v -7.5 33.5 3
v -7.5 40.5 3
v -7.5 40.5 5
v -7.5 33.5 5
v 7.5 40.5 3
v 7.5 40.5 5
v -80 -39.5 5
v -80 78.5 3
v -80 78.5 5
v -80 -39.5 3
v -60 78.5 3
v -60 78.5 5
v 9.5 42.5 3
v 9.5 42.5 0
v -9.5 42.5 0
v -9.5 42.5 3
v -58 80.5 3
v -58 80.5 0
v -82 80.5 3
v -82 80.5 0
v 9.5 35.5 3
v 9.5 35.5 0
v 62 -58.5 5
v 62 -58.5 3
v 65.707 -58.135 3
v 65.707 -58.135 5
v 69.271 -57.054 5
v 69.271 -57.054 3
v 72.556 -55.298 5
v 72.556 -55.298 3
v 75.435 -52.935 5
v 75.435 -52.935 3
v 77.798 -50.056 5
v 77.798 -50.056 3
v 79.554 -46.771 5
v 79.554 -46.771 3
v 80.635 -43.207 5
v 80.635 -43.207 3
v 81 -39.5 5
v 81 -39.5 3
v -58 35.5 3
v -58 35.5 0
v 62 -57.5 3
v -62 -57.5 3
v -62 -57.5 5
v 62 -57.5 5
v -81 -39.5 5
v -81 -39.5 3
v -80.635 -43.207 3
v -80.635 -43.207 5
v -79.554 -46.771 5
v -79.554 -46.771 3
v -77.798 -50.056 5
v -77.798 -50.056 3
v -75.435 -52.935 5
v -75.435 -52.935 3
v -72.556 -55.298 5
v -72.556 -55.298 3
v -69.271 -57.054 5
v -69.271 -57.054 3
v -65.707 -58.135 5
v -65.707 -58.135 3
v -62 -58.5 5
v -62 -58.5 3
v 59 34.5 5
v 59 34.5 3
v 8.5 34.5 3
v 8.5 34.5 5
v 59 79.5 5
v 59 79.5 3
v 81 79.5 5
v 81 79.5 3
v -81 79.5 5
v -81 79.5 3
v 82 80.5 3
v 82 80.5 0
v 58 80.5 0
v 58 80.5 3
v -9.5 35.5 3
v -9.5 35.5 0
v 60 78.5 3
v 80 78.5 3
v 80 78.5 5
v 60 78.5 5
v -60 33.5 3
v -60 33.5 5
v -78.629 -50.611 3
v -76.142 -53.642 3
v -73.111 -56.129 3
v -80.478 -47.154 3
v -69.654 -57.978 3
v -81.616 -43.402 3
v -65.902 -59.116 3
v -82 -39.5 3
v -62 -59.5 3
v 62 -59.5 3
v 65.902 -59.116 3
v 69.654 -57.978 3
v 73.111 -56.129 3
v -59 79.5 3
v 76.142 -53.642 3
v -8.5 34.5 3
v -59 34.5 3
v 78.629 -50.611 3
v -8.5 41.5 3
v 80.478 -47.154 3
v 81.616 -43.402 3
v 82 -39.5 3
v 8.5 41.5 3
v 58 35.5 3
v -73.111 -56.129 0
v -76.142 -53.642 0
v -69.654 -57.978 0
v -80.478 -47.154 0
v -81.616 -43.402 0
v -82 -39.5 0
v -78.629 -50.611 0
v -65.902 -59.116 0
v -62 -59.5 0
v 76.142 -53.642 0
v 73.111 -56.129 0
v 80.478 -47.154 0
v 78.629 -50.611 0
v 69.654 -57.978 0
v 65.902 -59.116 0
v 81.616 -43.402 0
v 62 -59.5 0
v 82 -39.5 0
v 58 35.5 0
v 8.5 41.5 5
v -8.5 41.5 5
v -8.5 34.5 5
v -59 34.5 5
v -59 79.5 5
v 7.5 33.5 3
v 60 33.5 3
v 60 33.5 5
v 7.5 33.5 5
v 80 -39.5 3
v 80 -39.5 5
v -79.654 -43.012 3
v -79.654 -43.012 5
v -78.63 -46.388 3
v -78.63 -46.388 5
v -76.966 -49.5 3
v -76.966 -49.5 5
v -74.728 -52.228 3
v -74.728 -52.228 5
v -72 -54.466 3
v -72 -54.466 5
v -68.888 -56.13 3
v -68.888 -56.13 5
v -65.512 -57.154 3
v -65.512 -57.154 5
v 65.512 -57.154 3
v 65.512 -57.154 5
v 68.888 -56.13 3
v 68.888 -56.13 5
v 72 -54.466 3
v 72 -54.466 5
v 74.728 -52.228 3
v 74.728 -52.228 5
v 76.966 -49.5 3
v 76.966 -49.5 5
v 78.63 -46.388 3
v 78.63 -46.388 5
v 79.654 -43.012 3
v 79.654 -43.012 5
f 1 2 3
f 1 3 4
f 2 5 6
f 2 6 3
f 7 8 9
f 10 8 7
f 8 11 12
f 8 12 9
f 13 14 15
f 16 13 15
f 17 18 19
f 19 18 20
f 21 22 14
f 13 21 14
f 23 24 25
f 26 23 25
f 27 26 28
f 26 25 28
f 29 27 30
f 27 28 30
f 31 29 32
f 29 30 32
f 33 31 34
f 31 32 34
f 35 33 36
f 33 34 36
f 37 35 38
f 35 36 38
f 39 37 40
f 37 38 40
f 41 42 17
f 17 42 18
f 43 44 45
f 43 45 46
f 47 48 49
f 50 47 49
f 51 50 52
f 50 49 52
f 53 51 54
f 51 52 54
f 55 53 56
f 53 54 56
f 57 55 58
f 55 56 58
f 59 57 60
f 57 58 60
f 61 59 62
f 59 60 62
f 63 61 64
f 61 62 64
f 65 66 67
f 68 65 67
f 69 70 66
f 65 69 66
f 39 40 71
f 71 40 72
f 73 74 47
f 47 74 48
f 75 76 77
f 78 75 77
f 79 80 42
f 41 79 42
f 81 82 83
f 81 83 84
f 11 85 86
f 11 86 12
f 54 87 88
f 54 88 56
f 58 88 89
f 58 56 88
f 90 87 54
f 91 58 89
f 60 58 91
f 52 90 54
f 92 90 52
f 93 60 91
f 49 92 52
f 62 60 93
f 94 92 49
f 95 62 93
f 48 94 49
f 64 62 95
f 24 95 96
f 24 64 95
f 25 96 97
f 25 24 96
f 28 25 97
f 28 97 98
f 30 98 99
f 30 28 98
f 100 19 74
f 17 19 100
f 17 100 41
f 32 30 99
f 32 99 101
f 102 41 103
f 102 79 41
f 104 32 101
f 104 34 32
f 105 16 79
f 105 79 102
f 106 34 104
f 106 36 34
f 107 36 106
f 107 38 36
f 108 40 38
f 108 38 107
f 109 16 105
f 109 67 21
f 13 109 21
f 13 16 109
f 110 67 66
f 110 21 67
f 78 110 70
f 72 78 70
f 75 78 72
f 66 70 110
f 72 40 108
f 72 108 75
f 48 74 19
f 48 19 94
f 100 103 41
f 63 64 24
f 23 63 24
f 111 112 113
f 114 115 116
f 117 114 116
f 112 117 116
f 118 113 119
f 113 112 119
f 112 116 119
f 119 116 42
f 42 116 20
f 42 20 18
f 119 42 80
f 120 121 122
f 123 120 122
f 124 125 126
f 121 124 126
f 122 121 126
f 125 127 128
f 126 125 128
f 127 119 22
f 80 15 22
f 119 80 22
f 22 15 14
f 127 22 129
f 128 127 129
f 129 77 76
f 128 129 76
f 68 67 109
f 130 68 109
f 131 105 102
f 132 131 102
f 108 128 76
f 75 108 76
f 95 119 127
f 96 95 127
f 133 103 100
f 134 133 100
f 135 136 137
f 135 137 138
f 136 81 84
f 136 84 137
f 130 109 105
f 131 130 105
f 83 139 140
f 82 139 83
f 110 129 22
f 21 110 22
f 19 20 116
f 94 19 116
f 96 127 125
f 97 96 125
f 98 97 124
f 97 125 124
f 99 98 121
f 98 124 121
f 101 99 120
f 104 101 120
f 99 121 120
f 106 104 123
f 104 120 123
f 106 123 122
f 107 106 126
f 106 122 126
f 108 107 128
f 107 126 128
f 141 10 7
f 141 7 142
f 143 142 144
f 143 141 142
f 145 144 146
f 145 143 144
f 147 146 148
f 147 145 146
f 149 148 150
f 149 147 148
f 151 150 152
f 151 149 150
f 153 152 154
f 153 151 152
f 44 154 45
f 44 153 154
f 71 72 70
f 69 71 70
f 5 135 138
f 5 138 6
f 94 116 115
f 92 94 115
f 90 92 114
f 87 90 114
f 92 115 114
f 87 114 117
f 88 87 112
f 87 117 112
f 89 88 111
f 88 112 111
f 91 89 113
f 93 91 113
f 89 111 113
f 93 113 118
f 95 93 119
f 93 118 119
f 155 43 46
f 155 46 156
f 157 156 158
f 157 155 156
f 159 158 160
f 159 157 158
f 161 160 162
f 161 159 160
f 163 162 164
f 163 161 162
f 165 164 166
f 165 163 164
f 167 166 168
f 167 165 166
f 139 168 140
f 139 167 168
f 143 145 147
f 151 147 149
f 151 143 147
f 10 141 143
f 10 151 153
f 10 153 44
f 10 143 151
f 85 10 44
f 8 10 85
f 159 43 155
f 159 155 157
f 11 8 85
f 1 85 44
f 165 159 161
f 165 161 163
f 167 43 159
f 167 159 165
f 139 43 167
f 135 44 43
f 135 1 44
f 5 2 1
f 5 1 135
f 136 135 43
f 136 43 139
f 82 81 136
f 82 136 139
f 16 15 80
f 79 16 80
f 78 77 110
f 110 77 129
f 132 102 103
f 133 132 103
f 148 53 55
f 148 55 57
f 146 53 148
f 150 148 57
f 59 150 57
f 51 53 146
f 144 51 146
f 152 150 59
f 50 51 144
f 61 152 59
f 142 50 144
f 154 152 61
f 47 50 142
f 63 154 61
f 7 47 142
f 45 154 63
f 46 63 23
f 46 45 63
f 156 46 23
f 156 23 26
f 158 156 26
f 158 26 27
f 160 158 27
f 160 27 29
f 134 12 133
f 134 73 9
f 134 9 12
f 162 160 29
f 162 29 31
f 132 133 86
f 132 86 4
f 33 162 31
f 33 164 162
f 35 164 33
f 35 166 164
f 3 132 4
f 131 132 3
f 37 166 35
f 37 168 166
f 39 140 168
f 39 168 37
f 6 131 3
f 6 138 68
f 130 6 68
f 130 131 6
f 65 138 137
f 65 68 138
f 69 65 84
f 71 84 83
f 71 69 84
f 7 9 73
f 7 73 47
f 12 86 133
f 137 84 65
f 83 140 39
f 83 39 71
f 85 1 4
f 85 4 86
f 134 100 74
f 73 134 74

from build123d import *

# Parameters (mm, degrees)
RESSALTO_EXTRUS_O1_DEPTH = 3
RESSALTO_EXTRUS_O2_DEPTH = 2


with BuildPart() as part:
    # Esboço1 → Ressalto-extrusão1 (new body)
    with BuildSketch(Plane.XY):
        with BuildLine():
            Line((-58, 35.5), (-58, 80.5))
            Line((-58, 80.5), (-82, 80.5))
            Line((-82, 80.5), (-82, -39.5))
            ThreePointArc((-82, -39.5), (-76.142135624, -53.642135624), (-62, -59.5))
            Line((-62, -59.5), (62, -59.5))
            ThreePointArc((62, -59.5), (76.142135624, -53.642135624), (82, -39.5))
            Line((82, -39.5), (82, 80.5))
            Line((82, 80.5), (58, 80.5))
            Line((58, 80.5), (58, 35.5))
            Line((58, 35.5), (9.5, 35.5))
            Line((9.5, 35.5), (9.5, 42.5))
            Line((9.5, 42.5), (-9.5, 42.5))
            Line((-9.5, 42.5), (-9.5, 35.5))
            Line((-9.5, 35.5), (-58, 35.5))
        make_face()
    extrude(amount=RESSALTO_EXTRUS_O1_DEPTH)

    # Esboço2 → Ressalto-extrusão2 (add)
    with BuildSketch(Plane.XY.offset(3)):
        with BuildLine():
            Line((-8.5, 34.5), (-59, 34.5))
            Line((-59, 34.5), (-59, 79.5))
            Line((-59, 79.5), (-81, 79.5))
            Line((-81, 79.5), (-81, -39.5))
            ThreePointArc((-81, -39.5), (-75.435028843, -52.935028843), (-62, -58.5))
            Line((-62, -58.5), (62, -58.5))
            ThreePointArc((62, -58.5), (75.435028843, -52.935028843), (81, -39.5))
            Line((81, -39.5), (81, 79.5))
            Line((81, 79.5), (59, 79.5))
            Line((59, 79.5), (59, 34.5))
            Line((59, 34.5), (8.5, 34.5))
            Line((8.5, 34.5), (8.5, 41.5))
            Line((8.5, 41.5), (-8.5, 41.5))
            Line((-8.5, 41.5), (-8.5, 34.5))
        make_face()
        with BuildLine():
            Line((-80, 78.5), (-80, -39.5))
            ThreePointArc((-80, -39.5), (-74.727922061, -52.227922061), (-62, -57.5))
            Line((-62, -57.5), (62, -57.5))
            ThreePointArc((62, -57.5), (74.727922061, -52.227922061), (80, -39.5))
            Line((80, -39.5), (80, 78.5))
            Line((80, 78.5), (60, 78.5))
            Line((60, 78.5), (60, 33.5))
            Line((60, 33.5), (7.5, 33.5))
            Line((7.5, 33.5), (7.5, 40.5))
            Line((7.5, 40.5), (-7.5, 40.5))
            Line((-7.5, 40.5), (-7.5, 33.5))
            Line((-7.5, 33.5), (-60, 33.5))
            Line((-60, 33.5), (-60, 78.5))
            Line((-60, 78.5), (-80, 78.5))
        make_face(mode=Mode.SUBTRACT)
    extrude(amount=RESSALTO_EXTRUS_O2_DEPTH)


solid = part.part
